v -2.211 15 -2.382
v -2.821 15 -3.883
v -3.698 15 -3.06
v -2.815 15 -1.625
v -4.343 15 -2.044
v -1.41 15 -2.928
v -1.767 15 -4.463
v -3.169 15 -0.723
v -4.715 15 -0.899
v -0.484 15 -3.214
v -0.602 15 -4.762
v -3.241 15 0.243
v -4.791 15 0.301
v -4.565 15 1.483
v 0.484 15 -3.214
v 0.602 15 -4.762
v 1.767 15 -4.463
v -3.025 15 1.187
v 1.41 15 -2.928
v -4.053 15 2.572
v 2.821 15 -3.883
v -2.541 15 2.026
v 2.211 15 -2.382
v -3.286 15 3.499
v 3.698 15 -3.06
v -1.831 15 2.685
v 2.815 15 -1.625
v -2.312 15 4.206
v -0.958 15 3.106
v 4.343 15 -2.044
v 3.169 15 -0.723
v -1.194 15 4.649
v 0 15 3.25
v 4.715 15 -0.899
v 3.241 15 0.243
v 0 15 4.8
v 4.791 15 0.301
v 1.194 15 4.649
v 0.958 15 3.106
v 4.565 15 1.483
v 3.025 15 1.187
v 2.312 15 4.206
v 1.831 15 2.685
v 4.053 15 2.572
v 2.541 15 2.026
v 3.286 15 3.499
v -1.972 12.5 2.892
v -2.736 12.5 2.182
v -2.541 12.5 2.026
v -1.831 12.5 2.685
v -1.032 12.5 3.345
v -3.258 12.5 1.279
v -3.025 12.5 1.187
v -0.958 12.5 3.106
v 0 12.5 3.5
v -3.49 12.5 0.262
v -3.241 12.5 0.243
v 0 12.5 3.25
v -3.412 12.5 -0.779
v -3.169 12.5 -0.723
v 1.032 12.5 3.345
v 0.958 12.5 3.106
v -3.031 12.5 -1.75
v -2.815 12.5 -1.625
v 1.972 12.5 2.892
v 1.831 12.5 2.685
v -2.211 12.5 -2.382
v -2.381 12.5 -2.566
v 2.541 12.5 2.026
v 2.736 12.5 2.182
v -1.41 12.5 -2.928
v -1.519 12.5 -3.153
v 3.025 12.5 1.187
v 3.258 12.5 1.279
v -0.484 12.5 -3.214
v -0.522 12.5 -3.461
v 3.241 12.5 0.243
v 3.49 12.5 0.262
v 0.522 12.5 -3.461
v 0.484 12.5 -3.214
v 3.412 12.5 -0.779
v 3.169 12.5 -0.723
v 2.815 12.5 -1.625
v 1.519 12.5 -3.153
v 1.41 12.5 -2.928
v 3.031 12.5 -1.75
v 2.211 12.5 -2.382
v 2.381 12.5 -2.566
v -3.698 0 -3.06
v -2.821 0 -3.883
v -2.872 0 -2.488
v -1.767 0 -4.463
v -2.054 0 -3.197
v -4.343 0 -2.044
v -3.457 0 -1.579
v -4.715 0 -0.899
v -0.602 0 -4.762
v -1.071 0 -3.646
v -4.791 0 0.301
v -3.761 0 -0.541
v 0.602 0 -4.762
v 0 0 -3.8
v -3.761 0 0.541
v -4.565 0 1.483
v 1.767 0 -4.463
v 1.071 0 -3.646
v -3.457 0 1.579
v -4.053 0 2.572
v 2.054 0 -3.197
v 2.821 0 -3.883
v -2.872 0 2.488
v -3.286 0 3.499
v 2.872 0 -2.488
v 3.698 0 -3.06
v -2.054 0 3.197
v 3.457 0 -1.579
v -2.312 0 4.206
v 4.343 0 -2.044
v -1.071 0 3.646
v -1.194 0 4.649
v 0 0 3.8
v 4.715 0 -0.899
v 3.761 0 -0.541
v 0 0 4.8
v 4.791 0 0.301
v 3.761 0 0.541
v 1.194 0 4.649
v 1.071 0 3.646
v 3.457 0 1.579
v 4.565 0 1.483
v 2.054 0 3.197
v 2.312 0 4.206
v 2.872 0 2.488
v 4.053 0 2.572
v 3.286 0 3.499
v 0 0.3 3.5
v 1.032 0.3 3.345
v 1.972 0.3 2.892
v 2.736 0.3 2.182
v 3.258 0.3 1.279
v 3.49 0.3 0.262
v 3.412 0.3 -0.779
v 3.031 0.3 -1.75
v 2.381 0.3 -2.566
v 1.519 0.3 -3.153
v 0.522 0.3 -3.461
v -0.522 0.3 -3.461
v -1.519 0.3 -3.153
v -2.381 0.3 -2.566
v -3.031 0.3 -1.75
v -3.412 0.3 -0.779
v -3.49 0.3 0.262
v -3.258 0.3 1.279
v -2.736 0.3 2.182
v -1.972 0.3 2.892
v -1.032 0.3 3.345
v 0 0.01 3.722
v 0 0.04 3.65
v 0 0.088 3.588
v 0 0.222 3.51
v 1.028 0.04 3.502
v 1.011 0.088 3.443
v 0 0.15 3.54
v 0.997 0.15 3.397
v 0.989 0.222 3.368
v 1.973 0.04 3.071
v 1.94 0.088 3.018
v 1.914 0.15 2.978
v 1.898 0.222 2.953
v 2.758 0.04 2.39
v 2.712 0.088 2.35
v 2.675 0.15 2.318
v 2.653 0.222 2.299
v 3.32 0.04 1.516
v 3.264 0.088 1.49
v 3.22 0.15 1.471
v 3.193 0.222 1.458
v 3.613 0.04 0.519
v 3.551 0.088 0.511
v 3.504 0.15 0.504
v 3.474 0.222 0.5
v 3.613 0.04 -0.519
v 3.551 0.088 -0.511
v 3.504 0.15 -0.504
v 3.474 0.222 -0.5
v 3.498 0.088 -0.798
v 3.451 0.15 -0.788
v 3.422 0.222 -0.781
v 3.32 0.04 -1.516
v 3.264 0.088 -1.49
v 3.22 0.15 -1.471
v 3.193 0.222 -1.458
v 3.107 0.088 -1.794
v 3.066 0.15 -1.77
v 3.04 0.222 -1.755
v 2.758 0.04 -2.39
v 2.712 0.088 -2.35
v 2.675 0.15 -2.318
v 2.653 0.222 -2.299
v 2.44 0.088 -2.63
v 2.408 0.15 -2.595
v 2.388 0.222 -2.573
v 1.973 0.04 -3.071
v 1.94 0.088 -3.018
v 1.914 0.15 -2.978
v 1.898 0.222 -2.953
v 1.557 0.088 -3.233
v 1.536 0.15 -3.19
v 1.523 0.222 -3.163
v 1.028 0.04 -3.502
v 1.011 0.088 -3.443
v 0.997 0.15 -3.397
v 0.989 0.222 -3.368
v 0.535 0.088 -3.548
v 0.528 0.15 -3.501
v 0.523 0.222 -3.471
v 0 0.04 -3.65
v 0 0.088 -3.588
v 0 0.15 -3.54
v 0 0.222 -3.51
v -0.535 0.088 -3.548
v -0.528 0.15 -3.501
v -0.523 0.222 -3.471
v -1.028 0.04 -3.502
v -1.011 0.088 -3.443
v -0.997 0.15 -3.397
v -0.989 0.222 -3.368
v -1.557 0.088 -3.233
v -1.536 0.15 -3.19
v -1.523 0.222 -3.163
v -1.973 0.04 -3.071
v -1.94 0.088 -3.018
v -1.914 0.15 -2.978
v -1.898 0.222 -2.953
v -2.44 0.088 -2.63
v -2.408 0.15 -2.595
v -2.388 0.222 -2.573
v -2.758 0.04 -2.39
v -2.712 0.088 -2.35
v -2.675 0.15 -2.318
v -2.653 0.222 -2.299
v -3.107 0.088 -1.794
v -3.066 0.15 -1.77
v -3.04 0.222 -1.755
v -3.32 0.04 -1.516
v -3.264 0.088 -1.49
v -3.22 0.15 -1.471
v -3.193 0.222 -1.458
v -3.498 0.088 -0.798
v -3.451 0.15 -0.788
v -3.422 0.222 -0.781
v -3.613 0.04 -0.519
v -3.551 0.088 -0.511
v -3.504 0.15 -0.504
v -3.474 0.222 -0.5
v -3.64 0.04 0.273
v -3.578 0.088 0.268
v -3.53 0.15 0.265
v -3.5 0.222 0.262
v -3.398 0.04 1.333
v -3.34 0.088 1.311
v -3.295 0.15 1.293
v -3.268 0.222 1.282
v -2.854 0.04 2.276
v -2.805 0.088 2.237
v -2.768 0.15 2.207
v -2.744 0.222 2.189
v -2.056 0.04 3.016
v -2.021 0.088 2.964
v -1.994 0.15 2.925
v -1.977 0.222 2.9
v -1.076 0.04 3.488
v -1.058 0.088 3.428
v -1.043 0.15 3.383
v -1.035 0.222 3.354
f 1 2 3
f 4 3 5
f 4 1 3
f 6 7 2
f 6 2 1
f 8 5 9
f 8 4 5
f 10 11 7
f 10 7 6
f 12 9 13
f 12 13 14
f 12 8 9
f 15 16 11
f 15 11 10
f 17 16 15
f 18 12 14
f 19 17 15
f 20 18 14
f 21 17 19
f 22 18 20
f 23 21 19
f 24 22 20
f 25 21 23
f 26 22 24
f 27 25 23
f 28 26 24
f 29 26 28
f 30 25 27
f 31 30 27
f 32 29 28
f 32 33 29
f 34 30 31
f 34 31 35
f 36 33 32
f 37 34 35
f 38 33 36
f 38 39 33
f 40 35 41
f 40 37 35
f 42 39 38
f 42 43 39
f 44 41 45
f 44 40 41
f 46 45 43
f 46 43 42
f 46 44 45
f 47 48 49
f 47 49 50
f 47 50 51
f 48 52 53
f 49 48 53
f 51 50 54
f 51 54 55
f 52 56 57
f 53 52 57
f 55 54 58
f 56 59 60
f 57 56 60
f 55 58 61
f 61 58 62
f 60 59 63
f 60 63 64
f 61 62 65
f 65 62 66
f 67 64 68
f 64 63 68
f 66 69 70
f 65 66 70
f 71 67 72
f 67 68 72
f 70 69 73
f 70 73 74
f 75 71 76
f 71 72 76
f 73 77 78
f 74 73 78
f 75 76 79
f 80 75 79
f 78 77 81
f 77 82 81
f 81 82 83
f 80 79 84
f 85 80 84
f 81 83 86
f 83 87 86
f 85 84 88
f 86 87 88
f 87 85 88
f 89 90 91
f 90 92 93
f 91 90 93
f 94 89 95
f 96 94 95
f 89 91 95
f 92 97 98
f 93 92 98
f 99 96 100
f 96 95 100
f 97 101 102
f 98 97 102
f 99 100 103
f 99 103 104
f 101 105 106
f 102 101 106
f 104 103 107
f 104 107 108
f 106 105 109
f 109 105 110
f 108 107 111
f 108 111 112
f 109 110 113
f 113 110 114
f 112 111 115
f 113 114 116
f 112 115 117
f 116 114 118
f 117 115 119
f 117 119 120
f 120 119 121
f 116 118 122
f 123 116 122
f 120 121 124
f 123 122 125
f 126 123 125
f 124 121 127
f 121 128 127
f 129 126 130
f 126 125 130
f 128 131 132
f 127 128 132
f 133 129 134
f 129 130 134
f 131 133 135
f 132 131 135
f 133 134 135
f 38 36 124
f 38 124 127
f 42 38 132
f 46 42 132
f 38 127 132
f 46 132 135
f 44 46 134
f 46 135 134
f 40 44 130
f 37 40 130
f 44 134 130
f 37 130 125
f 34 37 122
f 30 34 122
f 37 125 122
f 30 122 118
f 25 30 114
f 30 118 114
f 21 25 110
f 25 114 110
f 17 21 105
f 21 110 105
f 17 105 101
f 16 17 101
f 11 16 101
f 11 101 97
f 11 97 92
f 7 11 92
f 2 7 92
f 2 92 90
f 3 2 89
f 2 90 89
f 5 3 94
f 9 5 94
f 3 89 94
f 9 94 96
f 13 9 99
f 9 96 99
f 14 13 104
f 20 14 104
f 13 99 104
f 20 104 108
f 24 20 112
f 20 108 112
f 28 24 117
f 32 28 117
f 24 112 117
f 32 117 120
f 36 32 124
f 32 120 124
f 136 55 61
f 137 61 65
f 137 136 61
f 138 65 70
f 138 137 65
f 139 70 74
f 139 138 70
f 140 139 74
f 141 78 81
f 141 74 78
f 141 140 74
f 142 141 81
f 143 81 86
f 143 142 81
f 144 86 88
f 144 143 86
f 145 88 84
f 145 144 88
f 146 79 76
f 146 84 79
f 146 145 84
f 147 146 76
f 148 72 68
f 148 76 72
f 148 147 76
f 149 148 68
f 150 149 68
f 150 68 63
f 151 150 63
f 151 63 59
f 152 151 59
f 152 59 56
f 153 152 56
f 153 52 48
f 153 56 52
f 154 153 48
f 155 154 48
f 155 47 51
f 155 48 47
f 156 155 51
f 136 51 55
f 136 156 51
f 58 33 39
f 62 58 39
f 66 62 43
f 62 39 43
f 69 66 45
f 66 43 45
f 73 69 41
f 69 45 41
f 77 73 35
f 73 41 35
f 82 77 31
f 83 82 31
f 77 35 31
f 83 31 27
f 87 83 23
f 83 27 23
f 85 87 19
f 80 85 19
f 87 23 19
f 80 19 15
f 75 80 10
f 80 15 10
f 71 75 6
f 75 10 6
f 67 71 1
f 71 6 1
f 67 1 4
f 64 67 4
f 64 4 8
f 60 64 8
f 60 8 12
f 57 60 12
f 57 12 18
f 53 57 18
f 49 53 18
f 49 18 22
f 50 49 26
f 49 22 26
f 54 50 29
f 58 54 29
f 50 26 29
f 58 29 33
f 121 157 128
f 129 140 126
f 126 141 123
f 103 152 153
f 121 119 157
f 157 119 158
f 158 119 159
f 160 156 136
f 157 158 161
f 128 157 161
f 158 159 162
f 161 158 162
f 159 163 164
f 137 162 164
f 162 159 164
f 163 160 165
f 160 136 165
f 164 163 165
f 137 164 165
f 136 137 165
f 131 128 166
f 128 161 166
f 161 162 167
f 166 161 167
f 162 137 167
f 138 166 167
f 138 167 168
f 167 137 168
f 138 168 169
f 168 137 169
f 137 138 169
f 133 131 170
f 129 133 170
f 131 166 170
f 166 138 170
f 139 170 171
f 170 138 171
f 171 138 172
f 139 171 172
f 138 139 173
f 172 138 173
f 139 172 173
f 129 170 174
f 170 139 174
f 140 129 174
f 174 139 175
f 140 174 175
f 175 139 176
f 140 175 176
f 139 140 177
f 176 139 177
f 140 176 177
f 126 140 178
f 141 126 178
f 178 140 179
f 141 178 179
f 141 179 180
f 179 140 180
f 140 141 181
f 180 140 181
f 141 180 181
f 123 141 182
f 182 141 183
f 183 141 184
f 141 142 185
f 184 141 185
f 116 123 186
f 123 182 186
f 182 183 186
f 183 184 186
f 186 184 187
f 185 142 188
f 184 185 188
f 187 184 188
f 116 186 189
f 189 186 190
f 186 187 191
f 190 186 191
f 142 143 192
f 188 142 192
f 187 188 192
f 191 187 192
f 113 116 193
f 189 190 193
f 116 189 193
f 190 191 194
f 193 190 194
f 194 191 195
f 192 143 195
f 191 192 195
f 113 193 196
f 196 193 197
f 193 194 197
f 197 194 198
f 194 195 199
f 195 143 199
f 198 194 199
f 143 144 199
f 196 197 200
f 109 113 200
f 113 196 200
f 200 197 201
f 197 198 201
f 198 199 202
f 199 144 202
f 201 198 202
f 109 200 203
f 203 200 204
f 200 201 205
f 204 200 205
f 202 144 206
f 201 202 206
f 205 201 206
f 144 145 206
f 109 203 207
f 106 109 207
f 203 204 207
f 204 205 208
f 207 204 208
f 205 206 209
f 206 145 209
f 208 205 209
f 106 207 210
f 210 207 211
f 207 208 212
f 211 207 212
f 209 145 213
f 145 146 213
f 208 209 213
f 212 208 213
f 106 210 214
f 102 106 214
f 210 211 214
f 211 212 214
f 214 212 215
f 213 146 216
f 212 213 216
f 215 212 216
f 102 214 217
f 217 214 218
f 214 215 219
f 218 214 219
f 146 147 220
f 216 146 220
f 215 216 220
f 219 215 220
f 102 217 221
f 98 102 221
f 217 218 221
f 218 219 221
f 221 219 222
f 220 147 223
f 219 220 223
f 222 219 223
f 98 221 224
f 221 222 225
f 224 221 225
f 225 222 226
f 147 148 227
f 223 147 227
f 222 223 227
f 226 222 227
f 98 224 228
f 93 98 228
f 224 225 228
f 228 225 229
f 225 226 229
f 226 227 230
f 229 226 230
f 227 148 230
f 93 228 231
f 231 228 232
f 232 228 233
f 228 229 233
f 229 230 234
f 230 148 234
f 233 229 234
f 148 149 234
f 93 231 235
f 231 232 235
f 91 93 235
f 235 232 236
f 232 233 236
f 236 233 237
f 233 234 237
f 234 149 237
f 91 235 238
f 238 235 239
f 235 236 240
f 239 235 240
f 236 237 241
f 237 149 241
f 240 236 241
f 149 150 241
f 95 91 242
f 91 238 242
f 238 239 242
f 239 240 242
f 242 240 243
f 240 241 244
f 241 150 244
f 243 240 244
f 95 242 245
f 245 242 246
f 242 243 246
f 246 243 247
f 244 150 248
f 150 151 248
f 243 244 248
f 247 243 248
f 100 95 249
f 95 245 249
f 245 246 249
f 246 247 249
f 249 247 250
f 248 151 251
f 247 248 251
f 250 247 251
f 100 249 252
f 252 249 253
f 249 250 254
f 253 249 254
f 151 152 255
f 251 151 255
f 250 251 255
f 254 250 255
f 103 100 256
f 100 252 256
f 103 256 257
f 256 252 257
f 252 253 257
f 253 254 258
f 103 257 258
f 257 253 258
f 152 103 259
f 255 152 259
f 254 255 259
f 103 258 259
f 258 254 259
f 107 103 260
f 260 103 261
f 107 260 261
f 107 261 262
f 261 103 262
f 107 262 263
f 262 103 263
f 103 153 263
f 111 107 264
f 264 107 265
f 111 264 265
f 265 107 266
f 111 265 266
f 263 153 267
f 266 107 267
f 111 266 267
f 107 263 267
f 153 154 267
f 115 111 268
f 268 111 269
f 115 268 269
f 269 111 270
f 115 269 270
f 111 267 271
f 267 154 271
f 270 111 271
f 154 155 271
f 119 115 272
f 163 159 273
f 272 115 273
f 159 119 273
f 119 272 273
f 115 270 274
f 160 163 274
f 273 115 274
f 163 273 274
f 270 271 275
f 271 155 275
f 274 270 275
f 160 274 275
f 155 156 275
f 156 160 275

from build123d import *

# Parameters (mm, degrees)
CROQUIS1_R              = 4.8
CROQUIS1_R_2            = 3.5
SALIENTE_EXTRUIR1_DEPTH = 15
CROQUIS2_R              = 3.866185222
CROQUIS2_R_2            = 3.25
SALIENTE_EXTRUIR2_DEPTH = 2.5
REDONDEO1_R             = 0.3


with BuildPart() as part:
    # Croquis1 → Saliente-Extruir1 (new body)
    with BuildSketch(Plane(origin=(0, 0, 0), x_dir=(1, 0, 0), z_dir=(0, 1, 0))):
        with Locations(Location((0, 0, 0), (0, 0, 270))):
            Circle(CROQUIS1_R)
        with Locations(Location((0, 0, 0), (0, 0, 270))):
            Circle(CROQUIS1_R_2, mode=Mode.SUBTRACT)
    extrude(amount=SALIENTE_EXTRUIR1_DEPTH)

    # Croquis2 → Saliente-Extruir2 (add)
    with BuildSketch(Plane(origin=(0, 15, 0), x_dir=(1, 0, 0), z_dir=(0, 1, 0))):
        Circle(CROQUIS2_R)
        with Locations(Location((0, 0, 0), (0, 0, 270))):
            Circle(CROQUIS2_R_2, mode=Mode.SUBTRACT)
    extrude(amount=-SALIENTE_EXTRUIR2_DEPTH)

    # Redondeo1
    redondeo1_edges = [part.edges().sort_by_distance(p)[0] for p in [
        (0, 0, -3.5),
    ]]
    fillet(redondeo1_edges, radius=REDONDEO1_R)


solid = part.part
